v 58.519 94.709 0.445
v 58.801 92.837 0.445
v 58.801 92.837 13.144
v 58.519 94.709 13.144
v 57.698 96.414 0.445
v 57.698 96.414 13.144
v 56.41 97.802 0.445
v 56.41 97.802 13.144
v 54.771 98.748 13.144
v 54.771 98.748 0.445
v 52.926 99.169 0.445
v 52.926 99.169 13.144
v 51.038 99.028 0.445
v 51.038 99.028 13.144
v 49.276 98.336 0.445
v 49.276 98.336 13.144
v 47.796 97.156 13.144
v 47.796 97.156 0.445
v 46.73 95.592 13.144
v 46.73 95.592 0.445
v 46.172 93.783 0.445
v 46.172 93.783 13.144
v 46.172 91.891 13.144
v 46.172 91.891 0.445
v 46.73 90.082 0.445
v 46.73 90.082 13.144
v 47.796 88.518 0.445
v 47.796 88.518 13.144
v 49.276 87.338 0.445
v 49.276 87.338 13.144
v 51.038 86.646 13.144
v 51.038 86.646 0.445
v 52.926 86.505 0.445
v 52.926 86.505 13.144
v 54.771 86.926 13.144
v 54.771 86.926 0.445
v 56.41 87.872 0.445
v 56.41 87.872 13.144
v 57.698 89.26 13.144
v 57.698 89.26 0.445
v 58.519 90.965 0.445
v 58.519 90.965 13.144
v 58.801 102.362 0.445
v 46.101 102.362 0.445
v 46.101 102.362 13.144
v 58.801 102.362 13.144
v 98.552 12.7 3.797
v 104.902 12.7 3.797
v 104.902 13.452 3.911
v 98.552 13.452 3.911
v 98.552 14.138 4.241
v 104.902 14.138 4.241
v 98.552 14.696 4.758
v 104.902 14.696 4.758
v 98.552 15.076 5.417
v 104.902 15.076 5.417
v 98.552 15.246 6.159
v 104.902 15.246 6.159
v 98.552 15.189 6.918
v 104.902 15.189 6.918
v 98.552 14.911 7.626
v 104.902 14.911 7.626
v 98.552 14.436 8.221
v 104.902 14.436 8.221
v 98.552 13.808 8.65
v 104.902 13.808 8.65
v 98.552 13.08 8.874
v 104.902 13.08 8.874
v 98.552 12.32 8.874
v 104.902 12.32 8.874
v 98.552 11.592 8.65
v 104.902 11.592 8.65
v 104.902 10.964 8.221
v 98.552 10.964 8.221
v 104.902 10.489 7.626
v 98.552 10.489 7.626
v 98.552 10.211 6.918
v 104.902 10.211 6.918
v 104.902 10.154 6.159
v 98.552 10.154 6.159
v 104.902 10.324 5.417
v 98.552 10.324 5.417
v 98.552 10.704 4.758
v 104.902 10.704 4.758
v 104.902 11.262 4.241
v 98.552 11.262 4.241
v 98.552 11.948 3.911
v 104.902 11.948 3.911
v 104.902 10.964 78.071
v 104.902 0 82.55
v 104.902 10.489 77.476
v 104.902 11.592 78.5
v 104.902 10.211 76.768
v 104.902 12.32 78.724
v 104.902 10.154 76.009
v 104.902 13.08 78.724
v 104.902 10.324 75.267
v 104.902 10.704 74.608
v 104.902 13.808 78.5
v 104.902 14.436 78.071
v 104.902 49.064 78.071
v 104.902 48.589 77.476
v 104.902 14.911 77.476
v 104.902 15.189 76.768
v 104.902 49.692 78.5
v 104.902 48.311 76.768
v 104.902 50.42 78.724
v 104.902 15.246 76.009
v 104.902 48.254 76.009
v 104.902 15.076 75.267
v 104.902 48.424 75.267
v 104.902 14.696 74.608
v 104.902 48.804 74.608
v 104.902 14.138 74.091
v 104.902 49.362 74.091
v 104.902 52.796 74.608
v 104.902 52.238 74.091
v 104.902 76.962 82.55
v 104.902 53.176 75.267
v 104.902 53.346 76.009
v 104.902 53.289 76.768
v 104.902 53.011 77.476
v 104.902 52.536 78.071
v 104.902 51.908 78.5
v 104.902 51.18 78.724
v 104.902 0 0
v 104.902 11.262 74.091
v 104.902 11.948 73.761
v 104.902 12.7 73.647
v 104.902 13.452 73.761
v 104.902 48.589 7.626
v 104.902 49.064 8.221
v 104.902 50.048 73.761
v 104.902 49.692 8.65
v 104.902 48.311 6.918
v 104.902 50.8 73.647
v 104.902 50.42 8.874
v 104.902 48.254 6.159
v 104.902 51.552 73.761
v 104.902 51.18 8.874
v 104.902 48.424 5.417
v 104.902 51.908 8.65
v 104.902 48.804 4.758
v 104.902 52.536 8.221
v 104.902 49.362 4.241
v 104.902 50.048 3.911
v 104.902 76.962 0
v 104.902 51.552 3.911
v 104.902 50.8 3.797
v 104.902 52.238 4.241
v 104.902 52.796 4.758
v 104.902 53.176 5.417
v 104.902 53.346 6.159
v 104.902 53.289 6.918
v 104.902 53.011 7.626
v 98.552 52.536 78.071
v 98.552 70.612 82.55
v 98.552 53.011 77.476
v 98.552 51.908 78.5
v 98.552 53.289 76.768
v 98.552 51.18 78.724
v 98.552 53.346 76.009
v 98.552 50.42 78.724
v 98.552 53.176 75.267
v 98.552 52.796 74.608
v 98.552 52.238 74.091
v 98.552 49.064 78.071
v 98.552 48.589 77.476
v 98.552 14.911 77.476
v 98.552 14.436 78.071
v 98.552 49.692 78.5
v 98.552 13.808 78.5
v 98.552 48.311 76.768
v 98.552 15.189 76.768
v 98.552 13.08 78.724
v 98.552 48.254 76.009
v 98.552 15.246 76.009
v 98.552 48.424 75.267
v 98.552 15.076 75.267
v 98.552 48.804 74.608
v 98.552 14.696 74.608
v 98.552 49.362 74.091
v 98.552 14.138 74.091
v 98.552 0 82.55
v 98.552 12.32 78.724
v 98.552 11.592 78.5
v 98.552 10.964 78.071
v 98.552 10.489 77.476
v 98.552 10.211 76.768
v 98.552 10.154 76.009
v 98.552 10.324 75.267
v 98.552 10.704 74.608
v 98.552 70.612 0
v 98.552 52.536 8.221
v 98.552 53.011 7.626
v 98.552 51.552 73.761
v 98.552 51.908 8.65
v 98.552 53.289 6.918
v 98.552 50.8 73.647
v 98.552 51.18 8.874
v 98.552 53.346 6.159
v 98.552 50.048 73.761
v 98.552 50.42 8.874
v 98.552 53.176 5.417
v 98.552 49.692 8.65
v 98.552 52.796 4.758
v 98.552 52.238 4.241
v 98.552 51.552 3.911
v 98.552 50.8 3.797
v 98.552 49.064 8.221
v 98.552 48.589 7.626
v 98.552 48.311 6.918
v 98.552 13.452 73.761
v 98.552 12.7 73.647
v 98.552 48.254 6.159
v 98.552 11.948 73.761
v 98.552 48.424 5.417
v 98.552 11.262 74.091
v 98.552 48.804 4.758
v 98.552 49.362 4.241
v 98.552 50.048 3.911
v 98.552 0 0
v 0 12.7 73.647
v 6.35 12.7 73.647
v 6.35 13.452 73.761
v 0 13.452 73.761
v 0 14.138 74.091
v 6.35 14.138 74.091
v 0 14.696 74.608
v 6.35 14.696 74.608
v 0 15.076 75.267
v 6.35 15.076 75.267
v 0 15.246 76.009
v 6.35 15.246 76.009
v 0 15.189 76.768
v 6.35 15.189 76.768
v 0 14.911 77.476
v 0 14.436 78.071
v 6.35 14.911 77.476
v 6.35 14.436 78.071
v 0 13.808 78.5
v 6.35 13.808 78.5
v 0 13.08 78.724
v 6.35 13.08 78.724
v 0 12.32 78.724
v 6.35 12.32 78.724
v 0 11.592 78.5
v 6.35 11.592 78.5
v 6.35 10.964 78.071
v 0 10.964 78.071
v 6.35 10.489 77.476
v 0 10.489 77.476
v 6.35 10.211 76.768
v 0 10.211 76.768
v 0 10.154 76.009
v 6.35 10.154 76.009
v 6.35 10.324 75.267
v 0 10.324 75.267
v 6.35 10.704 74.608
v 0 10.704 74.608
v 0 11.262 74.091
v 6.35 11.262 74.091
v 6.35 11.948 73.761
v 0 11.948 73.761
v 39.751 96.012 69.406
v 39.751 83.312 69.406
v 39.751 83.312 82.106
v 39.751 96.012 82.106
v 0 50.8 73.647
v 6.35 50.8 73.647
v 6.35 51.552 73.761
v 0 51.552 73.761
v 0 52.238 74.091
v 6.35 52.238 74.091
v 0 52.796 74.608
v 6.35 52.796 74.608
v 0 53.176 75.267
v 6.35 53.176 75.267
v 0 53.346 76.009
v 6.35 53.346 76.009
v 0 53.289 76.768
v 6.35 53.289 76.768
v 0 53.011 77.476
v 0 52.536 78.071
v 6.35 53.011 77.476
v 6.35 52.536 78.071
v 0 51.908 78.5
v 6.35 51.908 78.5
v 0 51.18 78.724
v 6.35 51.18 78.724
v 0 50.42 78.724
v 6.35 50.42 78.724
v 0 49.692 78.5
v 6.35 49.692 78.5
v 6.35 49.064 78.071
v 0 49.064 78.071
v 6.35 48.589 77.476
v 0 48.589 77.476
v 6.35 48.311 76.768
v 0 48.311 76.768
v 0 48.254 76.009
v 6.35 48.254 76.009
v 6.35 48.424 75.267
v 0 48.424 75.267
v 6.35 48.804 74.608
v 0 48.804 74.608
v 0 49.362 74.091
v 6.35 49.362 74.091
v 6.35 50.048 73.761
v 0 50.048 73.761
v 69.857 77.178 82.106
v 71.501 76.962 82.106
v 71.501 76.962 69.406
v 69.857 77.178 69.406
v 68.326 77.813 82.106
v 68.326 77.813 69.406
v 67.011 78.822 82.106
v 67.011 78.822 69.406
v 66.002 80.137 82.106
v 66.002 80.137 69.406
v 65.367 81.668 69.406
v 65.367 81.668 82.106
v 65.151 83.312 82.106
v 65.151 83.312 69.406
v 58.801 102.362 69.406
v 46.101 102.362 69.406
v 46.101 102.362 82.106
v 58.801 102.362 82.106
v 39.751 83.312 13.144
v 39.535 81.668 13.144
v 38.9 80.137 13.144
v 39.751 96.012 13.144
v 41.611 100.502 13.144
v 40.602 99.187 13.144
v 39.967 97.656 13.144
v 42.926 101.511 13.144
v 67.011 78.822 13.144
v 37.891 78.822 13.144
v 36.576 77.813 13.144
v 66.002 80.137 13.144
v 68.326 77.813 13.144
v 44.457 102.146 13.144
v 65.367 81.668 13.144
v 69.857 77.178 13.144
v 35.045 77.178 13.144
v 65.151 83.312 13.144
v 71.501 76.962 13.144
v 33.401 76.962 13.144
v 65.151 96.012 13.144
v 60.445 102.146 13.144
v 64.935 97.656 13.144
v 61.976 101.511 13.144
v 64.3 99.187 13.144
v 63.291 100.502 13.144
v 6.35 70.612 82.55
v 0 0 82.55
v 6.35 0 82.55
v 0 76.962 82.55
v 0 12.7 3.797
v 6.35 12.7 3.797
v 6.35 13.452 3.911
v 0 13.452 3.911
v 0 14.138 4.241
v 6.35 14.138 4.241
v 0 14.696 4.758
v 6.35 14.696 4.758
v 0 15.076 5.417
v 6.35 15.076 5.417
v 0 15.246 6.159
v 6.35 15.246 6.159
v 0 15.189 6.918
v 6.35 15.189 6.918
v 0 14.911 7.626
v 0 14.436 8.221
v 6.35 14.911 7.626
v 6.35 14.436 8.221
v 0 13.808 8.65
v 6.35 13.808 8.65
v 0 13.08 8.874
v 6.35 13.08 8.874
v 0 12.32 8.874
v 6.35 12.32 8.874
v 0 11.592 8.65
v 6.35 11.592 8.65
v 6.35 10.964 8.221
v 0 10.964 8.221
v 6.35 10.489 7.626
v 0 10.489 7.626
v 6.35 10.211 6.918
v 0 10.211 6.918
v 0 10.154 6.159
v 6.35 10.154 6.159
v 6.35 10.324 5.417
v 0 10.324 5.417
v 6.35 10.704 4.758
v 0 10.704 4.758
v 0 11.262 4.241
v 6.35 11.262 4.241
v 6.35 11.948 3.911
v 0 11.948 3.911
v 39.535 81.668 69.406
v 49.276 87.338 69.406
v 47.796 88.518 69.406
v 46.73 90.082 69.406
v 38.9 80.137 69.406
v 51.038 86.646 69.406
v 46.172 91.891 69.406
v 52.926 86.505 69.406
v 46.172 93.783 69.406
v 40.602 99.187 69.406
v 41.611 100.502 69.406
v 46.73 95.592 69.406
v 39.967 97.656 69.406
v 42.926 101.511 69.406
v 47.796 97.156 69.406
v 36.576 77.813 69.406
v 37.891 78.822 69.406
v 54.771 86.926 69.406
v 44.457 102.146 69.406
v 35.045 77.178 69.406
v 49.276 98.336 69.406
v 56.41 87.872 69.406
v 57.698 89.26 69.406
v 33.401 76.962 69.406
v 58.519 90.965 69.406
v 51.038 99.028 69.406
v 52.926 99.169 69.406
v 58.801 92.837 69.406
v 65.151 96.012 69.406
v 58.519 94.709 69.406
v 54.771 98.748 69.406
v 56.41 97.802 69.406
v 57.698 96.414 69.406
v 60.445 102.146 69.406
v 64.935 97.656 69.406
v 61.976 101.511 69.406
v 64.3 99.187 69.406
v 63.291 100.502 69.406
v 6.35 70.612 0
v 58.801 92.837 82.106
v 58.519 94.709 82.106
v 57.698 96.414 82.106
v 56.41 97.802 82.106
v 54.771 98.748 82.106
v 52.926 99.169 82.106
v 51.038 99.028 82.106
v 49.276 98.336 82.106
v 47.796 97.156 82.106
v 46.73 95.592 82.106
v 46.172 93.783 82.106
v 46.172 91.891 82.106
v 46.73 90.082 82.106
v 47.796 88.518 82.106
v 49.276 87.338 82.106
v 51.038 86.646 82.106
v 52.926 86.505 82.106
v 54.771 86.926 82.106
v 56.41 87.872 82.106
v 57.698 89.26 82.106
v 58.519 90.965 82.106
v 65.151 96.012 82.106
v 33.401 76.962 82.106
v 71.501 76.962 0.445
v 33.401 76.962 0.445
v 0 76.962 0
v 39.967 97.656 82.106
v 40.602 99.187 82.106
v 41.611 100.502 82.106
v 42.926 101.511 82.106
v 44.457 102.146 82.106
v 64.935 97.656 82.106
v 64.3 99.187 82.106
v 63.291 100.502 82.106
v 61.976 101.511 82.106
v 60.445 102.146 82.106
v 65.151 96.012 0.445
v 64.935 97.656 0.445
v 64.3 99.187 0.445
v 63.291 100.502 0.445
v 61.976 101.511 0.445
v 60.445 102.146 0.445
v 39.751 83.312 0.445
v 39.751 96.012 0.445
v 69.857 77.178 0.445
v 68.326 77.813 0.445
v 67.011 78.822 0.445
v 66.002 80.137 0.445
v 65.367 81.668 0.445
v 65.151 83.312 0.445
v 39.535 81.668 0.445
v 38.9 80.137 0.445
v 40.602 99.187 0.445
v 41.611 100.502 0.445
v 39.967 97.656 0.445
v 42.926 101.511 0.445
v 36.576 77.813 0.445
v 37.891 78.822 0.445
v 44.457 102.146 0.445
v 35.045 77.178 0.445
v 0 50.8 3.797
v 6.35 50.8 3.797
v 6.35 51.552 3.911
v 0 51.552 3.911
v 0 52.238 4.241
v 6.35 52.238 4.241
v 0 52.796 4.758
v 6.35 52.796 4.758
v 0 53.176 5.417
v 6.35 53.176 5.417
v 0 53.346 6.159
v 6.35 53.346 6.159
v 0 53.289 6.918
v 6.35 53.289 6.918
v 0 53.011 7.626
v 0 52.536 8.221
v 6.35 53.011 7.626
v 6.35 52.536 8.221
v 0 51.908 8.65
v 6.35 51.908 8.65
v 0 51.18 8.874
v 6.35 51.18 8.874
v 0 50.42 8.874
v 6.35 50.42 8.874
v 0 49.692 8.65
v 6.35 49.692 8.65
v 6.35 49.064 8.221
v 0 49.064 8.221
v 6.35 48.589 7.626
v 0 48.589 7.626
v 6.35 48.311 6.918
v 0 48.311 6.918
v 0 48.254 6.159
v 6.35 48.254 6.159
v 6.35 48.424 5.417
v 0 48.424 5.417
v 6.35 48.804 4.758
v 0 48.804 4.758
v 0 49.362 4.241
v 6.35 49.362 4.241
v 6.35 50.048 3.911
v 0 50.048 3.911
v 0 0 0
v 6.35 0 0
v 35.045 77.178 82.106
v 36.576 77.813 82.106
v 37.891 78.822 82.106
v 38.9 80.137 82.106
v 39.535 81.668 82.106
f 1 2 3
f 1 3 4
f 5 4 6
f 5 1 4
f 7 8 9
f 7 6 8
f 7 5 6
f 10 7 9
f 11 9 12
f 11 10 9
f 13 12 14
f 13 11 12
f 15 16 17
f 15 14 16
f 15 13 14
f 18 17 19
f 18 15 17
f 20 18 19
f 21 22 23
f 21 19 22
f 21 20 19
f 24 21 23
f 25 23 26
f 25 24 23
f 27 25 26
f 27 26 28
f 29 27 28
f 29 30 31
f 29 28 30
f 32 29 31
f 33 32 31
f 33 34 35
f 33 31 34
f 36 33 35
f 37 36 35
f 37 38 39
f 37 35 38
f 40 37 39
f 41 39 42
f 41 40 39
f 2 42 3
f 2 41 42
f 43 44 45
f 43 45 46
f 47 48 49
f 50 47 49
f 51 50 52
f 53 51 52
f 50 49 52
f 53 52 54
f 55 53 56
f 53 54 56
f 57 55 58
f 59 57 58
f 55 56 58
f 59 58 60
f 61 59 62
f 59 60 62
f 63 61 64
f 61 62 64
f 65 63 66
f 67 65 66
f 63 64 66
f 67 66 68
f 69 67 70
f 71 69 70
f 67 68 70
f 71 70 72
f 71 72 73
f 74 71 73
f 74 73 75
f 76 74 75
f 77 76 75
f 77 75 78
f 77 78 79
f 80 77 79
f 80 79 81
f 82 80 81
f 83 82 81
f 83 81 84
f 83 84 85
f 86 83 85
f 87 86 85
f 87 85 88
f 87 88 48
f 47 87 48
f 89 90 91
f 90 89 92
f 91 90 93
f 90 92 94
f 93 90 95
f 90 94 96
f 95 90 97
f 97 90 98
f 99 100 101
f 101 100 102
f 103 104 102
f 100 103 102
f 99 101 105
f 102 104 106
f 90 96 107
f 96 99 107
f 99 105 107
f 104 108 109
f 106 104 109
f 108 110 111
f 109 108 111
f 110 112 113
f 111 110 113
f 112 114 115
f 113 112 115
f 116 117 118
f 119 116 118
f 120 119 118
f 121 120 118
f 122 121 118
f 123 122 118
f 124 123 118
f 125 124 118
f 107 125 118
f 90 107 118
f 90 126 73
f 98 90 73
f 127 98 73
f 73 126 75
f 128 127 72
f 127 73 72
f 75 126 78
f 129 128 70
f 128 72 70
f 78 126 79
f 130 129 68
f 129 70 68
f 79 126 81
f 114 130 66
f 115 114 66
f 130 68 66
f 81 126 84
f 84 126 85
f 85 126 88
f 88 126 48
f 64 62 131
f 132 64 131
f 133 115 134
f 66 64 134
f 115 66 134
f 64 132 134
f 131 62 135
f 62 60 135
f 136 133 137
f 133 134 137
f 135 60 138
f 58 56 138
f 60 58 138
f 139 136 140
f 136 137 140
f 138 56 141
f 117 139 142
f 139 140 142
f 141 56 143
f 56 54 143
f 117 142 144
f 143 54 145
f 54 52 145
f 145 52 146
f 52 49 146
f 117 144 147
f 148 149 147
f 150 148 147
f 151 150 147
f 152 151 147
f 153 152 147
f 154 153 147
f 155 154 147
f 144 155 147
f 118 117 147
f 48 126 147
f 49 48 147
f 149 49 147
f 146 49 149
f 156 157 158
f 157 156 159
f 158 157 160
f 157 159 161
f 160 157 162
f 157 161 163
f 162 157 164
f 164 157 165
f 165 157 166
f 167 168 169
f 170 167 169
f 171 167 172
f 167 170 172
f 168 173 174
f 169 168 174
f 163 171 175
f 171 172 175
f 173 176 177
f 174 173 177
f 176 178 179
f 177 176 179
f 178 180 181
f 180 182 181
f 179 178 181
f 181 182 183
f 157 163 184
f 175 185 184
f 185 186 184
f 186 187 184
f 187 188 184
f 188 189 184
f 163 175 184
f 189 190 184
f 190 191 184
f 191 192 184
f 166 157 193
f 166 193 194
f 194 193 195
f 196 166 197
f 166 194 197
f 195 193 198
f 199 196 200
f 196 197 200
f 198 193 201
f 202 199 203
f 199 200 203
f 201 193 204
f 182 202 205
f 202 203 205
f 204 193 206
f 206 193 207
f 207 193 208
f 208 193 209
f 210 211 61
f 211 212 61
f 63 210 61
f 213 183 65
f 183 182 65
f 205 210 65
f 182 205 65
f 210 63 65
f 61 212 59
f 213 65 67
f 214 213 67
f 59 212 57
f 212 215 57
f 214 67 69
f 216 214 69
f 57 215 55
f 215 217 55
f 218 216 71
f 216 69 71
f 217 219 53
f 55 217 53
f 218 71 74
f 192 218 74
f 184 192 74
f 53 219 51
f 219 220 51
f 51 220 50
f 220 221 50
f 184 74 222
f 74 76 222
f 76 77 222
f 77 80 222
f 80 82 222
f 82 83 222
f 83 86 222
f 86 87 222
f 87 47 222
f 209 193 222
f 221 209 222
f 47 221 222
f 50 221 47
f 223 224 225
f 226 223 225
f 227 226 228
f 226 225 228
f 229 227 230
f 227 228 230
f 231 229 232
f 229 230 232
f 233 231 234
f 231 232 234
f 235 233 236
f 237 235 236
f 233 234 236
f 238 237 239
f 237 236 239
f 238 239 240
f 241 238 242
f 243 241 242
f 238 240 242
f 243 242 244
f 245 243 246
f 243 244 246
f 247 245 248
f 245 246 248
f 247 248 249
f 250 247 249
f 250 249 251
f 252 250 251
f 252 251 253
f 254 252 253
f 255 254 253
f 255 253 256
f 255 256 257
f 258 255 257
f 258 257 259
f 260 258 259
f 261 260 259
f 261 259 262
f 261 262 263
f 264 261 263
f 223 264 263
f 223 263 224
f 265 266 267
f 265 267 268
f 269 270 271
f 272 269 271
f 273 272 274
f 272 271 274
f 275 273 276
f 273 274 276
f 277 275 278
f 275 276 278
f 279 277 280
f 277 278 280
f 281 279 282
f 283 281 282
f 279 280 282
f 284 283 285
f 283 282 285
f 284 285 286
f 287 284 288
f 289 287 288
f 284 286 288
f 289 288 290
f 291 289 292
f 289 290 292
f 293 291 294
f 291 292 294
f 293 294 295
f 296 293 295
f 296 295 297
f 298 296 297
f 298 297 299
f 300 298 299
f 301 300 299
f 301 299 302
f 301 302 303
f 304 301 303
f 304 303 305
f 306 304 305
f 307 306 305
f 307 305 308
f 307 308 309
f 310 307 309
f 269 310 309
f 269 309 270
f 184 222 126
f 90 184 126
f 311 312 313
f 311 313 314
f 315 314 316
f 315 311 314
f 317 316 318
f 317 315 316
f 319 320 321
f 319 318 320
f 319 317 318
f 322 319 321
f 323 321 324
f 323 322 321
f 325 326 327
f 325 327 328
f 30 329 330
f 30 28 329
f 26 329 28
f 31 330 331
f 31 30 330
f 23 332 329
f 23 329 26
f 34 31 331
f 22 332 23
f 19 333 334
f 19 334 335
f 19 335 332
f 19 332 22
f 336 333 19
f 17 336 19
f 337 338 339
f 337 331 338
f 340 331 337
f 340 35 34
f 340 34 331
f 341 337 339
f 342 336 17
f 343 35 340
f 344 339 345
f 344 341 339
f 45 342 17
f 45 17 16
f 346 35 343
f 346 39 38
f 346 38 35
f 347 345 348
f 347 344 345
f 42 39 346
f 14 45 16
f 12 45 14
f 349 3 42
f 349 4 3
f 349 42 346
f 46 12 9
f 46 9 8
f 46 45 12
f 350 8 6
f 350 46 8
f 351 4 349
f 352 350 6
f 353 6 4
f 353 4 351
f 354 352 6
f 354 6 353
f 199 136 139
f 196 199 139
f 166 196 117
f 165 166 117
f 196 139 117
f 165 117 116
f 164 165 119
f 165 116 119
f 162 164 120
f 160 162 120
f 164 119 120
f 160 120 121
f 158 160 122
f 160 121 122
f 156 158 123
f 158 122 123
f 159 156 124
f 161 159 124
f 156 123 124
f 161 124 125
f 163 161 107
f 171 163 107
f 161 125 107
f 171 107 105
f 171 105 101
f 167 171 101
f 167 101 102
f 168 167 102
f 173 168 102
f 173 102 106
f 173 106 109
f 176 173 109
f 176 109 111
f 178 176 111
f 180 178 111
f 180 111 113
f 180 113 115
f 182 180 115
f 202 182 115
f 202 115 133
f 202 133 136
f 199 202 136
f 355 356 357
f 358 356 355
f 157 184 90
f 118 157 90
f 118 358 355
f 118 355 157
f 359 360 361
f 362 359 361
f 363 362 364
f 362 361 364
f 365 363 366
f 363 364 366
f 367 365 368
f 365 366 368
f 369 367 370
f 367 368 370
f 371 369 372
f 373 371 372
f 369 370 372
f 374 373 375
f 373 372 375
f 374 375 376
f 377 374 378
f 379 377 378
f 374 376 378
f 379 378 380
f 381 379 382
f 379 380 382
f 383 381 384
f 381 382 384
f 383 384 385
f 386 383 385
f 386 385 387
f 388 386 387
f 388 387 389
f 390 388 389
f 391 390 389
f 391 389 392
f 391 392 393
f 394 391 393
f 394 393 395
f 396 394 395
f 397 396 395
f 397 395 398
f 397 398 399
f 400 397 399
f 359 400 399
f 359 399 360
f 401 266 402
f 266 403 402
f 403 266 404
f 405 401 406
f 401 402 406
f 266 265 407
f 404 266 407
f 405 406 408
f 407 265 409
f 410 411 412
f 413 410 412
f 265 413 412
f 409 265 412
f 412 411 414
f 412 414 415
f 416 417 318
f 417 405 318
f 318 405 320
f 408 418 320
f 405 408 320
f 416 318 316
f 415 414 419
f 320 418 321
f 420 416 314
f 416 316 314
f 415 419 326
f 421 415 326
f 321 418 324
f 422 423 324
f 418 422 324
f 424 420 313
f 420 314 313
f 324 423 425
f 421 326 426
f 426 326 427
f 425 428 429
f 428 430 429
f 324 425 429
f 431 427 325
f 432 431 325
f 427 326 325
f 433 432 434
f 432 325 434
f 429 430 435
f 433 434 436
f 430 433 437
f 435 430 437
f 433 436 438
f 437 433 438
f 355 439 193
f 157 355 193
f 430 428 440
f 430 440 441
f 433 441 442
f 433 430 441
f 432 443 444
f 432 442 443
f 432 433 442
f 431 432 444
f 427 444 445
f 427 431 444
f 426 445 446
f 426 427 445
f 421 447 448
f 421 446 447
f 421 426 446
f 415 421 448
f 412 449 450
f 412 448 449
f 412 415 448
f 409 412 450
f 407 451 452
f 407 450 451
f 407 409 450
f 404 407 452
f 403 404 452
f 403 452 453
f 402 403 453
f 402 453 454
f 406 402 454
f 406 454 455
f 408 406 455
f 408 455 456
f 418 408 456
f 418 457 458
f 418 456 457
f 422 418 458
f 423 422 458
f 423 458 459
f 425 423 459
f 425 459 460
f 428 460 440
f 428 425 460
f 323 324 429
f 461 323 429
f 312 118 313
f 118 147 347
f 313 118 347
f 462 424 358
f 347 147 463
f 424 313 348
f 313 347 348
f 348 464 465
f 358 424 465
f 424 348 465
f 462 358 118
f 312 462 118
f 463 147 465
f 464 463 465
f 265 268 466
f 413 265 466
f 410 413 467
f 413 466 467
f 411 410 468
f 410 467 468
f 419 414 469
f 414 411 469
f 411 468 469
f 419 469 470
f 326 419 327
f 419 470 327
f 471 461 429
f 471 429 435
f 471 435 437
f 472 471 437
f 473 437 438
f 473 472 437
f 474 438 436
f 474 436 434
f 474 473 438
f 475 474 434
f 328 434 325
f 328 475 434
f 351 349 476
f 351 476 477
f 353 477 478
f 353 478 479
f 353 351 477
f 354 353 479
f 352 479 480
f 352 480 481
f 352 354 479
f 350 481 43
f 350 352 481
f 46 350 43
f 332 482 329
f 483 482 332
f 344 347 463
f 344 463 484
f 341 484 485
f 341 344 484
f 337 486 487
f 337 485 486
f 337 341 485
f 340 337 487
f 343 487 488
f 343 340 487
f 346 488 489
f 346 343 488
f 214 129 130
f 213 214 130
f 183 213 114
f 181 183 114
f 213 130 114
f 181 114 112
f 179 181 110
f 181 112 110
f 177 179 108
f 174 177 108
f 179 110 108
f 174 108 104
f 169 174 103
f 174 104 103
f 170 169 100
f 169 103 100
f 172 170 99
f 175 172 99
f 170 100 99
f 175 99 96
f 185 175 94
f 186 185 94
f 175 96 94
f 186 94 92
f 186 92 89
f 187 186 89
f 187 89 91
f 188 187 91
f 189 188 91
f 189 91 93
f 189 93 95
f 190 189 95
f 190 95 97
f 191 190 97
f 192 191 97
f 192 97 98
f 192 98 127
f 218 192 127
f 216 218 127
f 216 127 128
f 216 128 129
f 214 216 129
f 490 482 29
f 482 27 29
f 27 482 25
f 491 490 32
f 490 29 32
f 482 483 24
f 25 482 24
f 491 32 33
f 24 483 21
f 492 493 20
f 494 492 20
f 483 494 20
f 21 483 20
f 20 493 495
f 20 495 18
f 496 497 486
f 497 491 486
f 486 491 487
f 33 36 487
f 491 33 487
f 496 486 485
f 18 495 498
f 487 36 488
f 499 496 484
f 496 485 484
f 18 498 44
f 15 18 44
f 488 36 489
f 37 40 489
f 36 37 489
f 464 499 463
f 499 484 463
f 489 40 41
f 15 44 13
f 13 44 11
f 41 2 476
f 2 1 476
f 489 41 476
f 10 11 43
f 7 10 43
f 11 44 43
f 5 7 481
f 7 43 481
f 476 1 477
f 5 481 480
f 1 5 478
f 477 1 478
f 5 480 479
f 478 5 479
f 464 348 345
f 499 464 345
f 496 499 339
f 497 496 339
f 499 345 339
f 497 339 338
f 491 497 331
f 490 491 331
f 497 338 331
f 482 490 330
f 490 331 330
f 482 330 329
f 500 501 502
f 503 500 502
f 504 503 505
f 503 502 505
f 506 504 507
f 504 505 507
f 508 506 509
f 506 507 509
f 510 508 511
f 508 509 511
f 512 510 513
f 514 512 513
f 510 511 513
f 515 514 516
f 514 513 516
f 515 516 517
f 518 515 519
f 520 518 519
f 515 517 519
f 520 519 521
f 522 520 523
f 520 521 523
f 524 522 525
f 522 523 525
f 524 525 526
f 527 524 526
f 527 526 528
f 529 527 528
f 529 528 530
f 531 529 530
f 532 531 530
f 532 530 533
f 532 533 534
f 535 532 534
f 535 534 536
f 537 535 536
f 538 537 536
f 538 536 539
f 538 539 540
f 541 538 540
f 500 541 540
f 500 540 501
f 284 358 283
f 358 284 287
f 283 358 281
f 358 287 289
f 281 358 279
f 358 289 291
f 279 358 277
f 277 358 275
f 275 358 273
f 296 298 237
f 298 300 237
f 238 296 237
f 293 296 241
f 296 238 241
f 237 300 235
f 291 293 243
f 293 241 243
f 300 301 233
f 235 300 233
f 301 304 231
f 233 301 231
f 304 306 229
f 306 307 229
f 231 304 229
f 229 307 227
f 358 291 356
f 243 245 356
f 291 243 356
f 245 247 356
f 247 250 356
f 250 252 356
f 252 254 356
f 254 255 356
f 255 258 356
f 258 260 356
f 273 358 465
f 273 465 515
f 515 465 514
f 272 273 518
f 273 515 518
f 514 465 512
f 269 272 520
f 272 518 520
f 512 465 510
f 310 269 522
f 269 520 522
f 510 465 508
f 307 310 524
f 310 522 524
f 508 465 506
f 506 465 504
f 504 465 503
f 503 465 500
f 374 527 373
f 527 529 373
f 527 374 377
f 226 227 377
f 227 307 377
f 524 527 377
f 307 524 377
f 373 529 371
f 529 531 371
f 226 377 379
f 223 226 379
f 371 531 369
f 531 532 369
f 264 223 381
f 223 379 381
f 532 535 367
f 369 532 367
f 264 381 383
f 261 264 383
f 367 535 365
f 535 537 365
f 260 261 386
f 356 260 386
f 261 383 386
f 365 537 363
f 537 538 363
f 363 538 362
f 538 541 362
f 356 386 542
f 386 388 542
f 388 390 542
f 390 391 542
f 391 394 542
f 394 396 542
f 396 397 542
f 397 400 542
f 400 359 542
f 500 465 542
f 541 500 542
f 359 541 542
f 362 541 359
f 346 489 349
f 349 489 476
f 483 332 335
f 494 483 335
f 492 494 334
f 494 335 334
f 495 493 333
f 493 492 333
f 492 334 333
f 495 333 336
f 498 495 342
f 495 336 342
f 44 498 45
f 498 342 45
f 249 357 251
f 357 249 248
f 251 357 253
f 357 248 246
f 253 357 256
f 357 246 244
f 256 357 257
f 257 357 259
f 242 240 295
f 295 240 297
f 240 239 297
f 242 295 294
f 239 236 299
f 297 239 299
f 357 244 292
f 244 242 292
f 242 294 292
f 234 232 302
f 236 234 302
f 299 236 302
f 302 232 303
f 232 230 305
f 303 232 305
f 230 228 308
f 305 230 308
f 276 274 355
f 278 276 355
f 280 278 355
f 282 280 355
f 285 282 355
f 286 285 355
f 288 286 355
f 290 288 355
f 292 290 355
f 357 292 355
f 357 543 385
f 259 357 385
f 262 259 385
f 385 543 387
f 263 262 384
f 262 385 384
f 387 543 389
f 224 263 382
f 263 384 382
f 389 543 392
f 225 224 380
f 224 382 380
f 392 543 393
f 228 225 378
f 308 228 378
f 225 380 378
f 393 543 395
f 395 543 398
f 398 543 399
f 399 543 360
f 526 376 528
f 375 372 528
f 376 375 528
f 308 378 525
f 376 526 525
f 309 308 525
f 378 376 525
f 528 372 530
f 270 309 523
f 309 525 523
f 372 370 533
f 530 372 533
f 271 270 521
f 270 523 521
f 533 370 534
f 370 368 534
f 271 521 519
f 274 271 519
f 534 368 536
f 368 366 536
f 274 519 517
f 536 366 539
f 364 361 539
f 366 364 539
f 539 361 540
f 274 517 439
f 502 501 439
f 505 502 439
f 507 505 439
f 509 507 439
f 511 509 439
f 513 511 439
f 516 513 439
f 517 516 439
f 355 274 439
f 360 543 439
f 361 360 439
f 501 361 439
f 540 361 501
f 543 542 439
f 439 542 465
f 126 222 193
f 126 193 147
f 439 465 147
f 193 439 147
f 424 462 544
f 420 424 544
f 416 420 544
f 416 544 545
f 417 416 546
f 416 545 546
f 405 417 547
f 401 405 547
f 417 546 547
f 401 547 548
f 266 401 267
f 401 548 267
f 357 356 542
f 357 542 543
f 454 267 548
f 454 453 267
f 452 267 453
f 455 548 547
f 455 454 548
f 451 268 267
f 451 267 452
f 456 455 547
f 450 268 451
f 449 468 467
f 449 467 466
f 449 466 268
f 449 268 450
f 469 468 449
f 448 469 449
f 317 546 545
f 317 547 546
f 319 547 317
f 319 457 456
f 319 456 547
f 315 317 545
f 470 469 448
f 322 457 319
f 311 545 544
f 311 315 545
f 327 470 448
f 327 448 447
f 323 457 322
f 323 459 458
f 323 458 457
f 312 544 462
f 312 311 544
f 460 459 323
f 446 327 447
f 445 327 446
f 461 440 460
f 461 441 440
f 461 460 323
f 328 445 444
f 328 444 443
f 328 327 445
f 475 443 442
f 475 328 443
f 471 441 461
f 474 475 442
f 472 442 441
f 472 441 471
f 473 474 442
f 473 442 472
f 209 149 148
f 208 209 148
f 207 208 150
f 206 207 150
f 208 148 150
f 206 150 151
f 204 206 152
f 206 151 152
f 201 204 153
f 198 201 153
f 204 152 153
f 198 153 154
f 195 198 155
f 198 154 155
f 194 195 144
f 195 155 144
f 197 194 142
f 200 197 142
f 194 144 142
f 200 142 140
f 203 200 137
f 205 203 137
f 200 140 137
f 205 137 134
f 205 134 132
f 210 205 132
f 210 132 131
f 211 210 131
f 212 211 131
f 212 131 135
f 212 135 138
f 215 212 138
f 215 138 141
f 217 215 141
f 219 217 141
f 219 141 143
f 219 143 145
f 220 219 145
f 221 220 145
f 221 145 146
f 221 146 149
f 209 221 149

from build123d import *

# Parameters (mm, degrees)
SKETCH1_W                   = 25.4
SKETCH1_H                   = 25.4
SKETCH1_R                   = 6.35
BOSS_EXTRUDE1_DEPTH         = 82.55
FILLET1_R                   = 6.35
SKETCH3_W                   = 136.608571953
SKETCH3_H                   = 27.79521791
SKETCH3_H_2                 = 56.261
SKETCH3_H_3                 = 24.259466636
CUT_EXTRUDE3_DEPTH          = 31.75
TAP_DRILL_FOR_1_4_20_TAP1_D = 5.1054


with BuildPart() as part:
    # Sketch1 → Boss-Extrude1 (new body)
    # profile 1 of 2: a face of its own
    with BuildSketch(Plane.XY):
        with Locations((52.451, 89.662)):
            Rectangle(SKETCH1_W, SKETCH1_H)
        with Locations((52.451, 92.837)):
            Circle(SKETCH1_R, mode=Mode.SUBTRACT)
    # profile 2 of 2: a face of its own
    with BuildSketch(Plane.XY):
        Polygon((6.35, 70.612), (98.552, 70.612), (98.552, 0), (104.902, 0), (104.902, 76.962), (0, 76.962), (0, 0), (6.35, 0), align=None)
    extrude(amount=BOSS_EXTRUDE1_DEPTH)

    # Fillet1
    fillet1_edges = [part.edges().sort_by_distance(p)[0] for p in [
        (65.151, 76.962, 41.275),
        (39.751, 76.962, 41.275),
        (39.751, 102.362, 41.275),
        (65.151, 102.362, 41.275),
    ]]
    fillet(fillet1_edges, radius=FILLET1_R)

    # Sketch3 → Cut-Extrude3 (cut)
    with BuildSketch(Plane(origin=(0, 108.712, 0), x_dir=(1, 0, 0), z_dir=(0, 1, 0))):
        with Locations((56.578258919, 13.453108955)):
            Rectangle(SKETCH3_W, SKETCH3_H)
        with Locations((56.578258919, -41.275)):
            Rectangle(SKETCH3_W, SKETCH3_H_2)
        with Locations((56.578258919, -94.235233318)):
            Rectangle(SKETCH3_W, SKETCH3_H_3)
    extrude(amount=-CUT_EXTRUDE3_DEPTH, mode=Mode.SUBTRACT)

    # Tap Drill for 1/4-20 Tap1 (through all)
    with Locations(Plane.ZY):
        with Locations((6.35, 50.8), (6.35, 12.7), (76.2, 12.7), (76.2, 50.8)):
            Hole(TAP_DRILL_FOR_1_4_20_TAP1_D / 2)


solid = part.part
